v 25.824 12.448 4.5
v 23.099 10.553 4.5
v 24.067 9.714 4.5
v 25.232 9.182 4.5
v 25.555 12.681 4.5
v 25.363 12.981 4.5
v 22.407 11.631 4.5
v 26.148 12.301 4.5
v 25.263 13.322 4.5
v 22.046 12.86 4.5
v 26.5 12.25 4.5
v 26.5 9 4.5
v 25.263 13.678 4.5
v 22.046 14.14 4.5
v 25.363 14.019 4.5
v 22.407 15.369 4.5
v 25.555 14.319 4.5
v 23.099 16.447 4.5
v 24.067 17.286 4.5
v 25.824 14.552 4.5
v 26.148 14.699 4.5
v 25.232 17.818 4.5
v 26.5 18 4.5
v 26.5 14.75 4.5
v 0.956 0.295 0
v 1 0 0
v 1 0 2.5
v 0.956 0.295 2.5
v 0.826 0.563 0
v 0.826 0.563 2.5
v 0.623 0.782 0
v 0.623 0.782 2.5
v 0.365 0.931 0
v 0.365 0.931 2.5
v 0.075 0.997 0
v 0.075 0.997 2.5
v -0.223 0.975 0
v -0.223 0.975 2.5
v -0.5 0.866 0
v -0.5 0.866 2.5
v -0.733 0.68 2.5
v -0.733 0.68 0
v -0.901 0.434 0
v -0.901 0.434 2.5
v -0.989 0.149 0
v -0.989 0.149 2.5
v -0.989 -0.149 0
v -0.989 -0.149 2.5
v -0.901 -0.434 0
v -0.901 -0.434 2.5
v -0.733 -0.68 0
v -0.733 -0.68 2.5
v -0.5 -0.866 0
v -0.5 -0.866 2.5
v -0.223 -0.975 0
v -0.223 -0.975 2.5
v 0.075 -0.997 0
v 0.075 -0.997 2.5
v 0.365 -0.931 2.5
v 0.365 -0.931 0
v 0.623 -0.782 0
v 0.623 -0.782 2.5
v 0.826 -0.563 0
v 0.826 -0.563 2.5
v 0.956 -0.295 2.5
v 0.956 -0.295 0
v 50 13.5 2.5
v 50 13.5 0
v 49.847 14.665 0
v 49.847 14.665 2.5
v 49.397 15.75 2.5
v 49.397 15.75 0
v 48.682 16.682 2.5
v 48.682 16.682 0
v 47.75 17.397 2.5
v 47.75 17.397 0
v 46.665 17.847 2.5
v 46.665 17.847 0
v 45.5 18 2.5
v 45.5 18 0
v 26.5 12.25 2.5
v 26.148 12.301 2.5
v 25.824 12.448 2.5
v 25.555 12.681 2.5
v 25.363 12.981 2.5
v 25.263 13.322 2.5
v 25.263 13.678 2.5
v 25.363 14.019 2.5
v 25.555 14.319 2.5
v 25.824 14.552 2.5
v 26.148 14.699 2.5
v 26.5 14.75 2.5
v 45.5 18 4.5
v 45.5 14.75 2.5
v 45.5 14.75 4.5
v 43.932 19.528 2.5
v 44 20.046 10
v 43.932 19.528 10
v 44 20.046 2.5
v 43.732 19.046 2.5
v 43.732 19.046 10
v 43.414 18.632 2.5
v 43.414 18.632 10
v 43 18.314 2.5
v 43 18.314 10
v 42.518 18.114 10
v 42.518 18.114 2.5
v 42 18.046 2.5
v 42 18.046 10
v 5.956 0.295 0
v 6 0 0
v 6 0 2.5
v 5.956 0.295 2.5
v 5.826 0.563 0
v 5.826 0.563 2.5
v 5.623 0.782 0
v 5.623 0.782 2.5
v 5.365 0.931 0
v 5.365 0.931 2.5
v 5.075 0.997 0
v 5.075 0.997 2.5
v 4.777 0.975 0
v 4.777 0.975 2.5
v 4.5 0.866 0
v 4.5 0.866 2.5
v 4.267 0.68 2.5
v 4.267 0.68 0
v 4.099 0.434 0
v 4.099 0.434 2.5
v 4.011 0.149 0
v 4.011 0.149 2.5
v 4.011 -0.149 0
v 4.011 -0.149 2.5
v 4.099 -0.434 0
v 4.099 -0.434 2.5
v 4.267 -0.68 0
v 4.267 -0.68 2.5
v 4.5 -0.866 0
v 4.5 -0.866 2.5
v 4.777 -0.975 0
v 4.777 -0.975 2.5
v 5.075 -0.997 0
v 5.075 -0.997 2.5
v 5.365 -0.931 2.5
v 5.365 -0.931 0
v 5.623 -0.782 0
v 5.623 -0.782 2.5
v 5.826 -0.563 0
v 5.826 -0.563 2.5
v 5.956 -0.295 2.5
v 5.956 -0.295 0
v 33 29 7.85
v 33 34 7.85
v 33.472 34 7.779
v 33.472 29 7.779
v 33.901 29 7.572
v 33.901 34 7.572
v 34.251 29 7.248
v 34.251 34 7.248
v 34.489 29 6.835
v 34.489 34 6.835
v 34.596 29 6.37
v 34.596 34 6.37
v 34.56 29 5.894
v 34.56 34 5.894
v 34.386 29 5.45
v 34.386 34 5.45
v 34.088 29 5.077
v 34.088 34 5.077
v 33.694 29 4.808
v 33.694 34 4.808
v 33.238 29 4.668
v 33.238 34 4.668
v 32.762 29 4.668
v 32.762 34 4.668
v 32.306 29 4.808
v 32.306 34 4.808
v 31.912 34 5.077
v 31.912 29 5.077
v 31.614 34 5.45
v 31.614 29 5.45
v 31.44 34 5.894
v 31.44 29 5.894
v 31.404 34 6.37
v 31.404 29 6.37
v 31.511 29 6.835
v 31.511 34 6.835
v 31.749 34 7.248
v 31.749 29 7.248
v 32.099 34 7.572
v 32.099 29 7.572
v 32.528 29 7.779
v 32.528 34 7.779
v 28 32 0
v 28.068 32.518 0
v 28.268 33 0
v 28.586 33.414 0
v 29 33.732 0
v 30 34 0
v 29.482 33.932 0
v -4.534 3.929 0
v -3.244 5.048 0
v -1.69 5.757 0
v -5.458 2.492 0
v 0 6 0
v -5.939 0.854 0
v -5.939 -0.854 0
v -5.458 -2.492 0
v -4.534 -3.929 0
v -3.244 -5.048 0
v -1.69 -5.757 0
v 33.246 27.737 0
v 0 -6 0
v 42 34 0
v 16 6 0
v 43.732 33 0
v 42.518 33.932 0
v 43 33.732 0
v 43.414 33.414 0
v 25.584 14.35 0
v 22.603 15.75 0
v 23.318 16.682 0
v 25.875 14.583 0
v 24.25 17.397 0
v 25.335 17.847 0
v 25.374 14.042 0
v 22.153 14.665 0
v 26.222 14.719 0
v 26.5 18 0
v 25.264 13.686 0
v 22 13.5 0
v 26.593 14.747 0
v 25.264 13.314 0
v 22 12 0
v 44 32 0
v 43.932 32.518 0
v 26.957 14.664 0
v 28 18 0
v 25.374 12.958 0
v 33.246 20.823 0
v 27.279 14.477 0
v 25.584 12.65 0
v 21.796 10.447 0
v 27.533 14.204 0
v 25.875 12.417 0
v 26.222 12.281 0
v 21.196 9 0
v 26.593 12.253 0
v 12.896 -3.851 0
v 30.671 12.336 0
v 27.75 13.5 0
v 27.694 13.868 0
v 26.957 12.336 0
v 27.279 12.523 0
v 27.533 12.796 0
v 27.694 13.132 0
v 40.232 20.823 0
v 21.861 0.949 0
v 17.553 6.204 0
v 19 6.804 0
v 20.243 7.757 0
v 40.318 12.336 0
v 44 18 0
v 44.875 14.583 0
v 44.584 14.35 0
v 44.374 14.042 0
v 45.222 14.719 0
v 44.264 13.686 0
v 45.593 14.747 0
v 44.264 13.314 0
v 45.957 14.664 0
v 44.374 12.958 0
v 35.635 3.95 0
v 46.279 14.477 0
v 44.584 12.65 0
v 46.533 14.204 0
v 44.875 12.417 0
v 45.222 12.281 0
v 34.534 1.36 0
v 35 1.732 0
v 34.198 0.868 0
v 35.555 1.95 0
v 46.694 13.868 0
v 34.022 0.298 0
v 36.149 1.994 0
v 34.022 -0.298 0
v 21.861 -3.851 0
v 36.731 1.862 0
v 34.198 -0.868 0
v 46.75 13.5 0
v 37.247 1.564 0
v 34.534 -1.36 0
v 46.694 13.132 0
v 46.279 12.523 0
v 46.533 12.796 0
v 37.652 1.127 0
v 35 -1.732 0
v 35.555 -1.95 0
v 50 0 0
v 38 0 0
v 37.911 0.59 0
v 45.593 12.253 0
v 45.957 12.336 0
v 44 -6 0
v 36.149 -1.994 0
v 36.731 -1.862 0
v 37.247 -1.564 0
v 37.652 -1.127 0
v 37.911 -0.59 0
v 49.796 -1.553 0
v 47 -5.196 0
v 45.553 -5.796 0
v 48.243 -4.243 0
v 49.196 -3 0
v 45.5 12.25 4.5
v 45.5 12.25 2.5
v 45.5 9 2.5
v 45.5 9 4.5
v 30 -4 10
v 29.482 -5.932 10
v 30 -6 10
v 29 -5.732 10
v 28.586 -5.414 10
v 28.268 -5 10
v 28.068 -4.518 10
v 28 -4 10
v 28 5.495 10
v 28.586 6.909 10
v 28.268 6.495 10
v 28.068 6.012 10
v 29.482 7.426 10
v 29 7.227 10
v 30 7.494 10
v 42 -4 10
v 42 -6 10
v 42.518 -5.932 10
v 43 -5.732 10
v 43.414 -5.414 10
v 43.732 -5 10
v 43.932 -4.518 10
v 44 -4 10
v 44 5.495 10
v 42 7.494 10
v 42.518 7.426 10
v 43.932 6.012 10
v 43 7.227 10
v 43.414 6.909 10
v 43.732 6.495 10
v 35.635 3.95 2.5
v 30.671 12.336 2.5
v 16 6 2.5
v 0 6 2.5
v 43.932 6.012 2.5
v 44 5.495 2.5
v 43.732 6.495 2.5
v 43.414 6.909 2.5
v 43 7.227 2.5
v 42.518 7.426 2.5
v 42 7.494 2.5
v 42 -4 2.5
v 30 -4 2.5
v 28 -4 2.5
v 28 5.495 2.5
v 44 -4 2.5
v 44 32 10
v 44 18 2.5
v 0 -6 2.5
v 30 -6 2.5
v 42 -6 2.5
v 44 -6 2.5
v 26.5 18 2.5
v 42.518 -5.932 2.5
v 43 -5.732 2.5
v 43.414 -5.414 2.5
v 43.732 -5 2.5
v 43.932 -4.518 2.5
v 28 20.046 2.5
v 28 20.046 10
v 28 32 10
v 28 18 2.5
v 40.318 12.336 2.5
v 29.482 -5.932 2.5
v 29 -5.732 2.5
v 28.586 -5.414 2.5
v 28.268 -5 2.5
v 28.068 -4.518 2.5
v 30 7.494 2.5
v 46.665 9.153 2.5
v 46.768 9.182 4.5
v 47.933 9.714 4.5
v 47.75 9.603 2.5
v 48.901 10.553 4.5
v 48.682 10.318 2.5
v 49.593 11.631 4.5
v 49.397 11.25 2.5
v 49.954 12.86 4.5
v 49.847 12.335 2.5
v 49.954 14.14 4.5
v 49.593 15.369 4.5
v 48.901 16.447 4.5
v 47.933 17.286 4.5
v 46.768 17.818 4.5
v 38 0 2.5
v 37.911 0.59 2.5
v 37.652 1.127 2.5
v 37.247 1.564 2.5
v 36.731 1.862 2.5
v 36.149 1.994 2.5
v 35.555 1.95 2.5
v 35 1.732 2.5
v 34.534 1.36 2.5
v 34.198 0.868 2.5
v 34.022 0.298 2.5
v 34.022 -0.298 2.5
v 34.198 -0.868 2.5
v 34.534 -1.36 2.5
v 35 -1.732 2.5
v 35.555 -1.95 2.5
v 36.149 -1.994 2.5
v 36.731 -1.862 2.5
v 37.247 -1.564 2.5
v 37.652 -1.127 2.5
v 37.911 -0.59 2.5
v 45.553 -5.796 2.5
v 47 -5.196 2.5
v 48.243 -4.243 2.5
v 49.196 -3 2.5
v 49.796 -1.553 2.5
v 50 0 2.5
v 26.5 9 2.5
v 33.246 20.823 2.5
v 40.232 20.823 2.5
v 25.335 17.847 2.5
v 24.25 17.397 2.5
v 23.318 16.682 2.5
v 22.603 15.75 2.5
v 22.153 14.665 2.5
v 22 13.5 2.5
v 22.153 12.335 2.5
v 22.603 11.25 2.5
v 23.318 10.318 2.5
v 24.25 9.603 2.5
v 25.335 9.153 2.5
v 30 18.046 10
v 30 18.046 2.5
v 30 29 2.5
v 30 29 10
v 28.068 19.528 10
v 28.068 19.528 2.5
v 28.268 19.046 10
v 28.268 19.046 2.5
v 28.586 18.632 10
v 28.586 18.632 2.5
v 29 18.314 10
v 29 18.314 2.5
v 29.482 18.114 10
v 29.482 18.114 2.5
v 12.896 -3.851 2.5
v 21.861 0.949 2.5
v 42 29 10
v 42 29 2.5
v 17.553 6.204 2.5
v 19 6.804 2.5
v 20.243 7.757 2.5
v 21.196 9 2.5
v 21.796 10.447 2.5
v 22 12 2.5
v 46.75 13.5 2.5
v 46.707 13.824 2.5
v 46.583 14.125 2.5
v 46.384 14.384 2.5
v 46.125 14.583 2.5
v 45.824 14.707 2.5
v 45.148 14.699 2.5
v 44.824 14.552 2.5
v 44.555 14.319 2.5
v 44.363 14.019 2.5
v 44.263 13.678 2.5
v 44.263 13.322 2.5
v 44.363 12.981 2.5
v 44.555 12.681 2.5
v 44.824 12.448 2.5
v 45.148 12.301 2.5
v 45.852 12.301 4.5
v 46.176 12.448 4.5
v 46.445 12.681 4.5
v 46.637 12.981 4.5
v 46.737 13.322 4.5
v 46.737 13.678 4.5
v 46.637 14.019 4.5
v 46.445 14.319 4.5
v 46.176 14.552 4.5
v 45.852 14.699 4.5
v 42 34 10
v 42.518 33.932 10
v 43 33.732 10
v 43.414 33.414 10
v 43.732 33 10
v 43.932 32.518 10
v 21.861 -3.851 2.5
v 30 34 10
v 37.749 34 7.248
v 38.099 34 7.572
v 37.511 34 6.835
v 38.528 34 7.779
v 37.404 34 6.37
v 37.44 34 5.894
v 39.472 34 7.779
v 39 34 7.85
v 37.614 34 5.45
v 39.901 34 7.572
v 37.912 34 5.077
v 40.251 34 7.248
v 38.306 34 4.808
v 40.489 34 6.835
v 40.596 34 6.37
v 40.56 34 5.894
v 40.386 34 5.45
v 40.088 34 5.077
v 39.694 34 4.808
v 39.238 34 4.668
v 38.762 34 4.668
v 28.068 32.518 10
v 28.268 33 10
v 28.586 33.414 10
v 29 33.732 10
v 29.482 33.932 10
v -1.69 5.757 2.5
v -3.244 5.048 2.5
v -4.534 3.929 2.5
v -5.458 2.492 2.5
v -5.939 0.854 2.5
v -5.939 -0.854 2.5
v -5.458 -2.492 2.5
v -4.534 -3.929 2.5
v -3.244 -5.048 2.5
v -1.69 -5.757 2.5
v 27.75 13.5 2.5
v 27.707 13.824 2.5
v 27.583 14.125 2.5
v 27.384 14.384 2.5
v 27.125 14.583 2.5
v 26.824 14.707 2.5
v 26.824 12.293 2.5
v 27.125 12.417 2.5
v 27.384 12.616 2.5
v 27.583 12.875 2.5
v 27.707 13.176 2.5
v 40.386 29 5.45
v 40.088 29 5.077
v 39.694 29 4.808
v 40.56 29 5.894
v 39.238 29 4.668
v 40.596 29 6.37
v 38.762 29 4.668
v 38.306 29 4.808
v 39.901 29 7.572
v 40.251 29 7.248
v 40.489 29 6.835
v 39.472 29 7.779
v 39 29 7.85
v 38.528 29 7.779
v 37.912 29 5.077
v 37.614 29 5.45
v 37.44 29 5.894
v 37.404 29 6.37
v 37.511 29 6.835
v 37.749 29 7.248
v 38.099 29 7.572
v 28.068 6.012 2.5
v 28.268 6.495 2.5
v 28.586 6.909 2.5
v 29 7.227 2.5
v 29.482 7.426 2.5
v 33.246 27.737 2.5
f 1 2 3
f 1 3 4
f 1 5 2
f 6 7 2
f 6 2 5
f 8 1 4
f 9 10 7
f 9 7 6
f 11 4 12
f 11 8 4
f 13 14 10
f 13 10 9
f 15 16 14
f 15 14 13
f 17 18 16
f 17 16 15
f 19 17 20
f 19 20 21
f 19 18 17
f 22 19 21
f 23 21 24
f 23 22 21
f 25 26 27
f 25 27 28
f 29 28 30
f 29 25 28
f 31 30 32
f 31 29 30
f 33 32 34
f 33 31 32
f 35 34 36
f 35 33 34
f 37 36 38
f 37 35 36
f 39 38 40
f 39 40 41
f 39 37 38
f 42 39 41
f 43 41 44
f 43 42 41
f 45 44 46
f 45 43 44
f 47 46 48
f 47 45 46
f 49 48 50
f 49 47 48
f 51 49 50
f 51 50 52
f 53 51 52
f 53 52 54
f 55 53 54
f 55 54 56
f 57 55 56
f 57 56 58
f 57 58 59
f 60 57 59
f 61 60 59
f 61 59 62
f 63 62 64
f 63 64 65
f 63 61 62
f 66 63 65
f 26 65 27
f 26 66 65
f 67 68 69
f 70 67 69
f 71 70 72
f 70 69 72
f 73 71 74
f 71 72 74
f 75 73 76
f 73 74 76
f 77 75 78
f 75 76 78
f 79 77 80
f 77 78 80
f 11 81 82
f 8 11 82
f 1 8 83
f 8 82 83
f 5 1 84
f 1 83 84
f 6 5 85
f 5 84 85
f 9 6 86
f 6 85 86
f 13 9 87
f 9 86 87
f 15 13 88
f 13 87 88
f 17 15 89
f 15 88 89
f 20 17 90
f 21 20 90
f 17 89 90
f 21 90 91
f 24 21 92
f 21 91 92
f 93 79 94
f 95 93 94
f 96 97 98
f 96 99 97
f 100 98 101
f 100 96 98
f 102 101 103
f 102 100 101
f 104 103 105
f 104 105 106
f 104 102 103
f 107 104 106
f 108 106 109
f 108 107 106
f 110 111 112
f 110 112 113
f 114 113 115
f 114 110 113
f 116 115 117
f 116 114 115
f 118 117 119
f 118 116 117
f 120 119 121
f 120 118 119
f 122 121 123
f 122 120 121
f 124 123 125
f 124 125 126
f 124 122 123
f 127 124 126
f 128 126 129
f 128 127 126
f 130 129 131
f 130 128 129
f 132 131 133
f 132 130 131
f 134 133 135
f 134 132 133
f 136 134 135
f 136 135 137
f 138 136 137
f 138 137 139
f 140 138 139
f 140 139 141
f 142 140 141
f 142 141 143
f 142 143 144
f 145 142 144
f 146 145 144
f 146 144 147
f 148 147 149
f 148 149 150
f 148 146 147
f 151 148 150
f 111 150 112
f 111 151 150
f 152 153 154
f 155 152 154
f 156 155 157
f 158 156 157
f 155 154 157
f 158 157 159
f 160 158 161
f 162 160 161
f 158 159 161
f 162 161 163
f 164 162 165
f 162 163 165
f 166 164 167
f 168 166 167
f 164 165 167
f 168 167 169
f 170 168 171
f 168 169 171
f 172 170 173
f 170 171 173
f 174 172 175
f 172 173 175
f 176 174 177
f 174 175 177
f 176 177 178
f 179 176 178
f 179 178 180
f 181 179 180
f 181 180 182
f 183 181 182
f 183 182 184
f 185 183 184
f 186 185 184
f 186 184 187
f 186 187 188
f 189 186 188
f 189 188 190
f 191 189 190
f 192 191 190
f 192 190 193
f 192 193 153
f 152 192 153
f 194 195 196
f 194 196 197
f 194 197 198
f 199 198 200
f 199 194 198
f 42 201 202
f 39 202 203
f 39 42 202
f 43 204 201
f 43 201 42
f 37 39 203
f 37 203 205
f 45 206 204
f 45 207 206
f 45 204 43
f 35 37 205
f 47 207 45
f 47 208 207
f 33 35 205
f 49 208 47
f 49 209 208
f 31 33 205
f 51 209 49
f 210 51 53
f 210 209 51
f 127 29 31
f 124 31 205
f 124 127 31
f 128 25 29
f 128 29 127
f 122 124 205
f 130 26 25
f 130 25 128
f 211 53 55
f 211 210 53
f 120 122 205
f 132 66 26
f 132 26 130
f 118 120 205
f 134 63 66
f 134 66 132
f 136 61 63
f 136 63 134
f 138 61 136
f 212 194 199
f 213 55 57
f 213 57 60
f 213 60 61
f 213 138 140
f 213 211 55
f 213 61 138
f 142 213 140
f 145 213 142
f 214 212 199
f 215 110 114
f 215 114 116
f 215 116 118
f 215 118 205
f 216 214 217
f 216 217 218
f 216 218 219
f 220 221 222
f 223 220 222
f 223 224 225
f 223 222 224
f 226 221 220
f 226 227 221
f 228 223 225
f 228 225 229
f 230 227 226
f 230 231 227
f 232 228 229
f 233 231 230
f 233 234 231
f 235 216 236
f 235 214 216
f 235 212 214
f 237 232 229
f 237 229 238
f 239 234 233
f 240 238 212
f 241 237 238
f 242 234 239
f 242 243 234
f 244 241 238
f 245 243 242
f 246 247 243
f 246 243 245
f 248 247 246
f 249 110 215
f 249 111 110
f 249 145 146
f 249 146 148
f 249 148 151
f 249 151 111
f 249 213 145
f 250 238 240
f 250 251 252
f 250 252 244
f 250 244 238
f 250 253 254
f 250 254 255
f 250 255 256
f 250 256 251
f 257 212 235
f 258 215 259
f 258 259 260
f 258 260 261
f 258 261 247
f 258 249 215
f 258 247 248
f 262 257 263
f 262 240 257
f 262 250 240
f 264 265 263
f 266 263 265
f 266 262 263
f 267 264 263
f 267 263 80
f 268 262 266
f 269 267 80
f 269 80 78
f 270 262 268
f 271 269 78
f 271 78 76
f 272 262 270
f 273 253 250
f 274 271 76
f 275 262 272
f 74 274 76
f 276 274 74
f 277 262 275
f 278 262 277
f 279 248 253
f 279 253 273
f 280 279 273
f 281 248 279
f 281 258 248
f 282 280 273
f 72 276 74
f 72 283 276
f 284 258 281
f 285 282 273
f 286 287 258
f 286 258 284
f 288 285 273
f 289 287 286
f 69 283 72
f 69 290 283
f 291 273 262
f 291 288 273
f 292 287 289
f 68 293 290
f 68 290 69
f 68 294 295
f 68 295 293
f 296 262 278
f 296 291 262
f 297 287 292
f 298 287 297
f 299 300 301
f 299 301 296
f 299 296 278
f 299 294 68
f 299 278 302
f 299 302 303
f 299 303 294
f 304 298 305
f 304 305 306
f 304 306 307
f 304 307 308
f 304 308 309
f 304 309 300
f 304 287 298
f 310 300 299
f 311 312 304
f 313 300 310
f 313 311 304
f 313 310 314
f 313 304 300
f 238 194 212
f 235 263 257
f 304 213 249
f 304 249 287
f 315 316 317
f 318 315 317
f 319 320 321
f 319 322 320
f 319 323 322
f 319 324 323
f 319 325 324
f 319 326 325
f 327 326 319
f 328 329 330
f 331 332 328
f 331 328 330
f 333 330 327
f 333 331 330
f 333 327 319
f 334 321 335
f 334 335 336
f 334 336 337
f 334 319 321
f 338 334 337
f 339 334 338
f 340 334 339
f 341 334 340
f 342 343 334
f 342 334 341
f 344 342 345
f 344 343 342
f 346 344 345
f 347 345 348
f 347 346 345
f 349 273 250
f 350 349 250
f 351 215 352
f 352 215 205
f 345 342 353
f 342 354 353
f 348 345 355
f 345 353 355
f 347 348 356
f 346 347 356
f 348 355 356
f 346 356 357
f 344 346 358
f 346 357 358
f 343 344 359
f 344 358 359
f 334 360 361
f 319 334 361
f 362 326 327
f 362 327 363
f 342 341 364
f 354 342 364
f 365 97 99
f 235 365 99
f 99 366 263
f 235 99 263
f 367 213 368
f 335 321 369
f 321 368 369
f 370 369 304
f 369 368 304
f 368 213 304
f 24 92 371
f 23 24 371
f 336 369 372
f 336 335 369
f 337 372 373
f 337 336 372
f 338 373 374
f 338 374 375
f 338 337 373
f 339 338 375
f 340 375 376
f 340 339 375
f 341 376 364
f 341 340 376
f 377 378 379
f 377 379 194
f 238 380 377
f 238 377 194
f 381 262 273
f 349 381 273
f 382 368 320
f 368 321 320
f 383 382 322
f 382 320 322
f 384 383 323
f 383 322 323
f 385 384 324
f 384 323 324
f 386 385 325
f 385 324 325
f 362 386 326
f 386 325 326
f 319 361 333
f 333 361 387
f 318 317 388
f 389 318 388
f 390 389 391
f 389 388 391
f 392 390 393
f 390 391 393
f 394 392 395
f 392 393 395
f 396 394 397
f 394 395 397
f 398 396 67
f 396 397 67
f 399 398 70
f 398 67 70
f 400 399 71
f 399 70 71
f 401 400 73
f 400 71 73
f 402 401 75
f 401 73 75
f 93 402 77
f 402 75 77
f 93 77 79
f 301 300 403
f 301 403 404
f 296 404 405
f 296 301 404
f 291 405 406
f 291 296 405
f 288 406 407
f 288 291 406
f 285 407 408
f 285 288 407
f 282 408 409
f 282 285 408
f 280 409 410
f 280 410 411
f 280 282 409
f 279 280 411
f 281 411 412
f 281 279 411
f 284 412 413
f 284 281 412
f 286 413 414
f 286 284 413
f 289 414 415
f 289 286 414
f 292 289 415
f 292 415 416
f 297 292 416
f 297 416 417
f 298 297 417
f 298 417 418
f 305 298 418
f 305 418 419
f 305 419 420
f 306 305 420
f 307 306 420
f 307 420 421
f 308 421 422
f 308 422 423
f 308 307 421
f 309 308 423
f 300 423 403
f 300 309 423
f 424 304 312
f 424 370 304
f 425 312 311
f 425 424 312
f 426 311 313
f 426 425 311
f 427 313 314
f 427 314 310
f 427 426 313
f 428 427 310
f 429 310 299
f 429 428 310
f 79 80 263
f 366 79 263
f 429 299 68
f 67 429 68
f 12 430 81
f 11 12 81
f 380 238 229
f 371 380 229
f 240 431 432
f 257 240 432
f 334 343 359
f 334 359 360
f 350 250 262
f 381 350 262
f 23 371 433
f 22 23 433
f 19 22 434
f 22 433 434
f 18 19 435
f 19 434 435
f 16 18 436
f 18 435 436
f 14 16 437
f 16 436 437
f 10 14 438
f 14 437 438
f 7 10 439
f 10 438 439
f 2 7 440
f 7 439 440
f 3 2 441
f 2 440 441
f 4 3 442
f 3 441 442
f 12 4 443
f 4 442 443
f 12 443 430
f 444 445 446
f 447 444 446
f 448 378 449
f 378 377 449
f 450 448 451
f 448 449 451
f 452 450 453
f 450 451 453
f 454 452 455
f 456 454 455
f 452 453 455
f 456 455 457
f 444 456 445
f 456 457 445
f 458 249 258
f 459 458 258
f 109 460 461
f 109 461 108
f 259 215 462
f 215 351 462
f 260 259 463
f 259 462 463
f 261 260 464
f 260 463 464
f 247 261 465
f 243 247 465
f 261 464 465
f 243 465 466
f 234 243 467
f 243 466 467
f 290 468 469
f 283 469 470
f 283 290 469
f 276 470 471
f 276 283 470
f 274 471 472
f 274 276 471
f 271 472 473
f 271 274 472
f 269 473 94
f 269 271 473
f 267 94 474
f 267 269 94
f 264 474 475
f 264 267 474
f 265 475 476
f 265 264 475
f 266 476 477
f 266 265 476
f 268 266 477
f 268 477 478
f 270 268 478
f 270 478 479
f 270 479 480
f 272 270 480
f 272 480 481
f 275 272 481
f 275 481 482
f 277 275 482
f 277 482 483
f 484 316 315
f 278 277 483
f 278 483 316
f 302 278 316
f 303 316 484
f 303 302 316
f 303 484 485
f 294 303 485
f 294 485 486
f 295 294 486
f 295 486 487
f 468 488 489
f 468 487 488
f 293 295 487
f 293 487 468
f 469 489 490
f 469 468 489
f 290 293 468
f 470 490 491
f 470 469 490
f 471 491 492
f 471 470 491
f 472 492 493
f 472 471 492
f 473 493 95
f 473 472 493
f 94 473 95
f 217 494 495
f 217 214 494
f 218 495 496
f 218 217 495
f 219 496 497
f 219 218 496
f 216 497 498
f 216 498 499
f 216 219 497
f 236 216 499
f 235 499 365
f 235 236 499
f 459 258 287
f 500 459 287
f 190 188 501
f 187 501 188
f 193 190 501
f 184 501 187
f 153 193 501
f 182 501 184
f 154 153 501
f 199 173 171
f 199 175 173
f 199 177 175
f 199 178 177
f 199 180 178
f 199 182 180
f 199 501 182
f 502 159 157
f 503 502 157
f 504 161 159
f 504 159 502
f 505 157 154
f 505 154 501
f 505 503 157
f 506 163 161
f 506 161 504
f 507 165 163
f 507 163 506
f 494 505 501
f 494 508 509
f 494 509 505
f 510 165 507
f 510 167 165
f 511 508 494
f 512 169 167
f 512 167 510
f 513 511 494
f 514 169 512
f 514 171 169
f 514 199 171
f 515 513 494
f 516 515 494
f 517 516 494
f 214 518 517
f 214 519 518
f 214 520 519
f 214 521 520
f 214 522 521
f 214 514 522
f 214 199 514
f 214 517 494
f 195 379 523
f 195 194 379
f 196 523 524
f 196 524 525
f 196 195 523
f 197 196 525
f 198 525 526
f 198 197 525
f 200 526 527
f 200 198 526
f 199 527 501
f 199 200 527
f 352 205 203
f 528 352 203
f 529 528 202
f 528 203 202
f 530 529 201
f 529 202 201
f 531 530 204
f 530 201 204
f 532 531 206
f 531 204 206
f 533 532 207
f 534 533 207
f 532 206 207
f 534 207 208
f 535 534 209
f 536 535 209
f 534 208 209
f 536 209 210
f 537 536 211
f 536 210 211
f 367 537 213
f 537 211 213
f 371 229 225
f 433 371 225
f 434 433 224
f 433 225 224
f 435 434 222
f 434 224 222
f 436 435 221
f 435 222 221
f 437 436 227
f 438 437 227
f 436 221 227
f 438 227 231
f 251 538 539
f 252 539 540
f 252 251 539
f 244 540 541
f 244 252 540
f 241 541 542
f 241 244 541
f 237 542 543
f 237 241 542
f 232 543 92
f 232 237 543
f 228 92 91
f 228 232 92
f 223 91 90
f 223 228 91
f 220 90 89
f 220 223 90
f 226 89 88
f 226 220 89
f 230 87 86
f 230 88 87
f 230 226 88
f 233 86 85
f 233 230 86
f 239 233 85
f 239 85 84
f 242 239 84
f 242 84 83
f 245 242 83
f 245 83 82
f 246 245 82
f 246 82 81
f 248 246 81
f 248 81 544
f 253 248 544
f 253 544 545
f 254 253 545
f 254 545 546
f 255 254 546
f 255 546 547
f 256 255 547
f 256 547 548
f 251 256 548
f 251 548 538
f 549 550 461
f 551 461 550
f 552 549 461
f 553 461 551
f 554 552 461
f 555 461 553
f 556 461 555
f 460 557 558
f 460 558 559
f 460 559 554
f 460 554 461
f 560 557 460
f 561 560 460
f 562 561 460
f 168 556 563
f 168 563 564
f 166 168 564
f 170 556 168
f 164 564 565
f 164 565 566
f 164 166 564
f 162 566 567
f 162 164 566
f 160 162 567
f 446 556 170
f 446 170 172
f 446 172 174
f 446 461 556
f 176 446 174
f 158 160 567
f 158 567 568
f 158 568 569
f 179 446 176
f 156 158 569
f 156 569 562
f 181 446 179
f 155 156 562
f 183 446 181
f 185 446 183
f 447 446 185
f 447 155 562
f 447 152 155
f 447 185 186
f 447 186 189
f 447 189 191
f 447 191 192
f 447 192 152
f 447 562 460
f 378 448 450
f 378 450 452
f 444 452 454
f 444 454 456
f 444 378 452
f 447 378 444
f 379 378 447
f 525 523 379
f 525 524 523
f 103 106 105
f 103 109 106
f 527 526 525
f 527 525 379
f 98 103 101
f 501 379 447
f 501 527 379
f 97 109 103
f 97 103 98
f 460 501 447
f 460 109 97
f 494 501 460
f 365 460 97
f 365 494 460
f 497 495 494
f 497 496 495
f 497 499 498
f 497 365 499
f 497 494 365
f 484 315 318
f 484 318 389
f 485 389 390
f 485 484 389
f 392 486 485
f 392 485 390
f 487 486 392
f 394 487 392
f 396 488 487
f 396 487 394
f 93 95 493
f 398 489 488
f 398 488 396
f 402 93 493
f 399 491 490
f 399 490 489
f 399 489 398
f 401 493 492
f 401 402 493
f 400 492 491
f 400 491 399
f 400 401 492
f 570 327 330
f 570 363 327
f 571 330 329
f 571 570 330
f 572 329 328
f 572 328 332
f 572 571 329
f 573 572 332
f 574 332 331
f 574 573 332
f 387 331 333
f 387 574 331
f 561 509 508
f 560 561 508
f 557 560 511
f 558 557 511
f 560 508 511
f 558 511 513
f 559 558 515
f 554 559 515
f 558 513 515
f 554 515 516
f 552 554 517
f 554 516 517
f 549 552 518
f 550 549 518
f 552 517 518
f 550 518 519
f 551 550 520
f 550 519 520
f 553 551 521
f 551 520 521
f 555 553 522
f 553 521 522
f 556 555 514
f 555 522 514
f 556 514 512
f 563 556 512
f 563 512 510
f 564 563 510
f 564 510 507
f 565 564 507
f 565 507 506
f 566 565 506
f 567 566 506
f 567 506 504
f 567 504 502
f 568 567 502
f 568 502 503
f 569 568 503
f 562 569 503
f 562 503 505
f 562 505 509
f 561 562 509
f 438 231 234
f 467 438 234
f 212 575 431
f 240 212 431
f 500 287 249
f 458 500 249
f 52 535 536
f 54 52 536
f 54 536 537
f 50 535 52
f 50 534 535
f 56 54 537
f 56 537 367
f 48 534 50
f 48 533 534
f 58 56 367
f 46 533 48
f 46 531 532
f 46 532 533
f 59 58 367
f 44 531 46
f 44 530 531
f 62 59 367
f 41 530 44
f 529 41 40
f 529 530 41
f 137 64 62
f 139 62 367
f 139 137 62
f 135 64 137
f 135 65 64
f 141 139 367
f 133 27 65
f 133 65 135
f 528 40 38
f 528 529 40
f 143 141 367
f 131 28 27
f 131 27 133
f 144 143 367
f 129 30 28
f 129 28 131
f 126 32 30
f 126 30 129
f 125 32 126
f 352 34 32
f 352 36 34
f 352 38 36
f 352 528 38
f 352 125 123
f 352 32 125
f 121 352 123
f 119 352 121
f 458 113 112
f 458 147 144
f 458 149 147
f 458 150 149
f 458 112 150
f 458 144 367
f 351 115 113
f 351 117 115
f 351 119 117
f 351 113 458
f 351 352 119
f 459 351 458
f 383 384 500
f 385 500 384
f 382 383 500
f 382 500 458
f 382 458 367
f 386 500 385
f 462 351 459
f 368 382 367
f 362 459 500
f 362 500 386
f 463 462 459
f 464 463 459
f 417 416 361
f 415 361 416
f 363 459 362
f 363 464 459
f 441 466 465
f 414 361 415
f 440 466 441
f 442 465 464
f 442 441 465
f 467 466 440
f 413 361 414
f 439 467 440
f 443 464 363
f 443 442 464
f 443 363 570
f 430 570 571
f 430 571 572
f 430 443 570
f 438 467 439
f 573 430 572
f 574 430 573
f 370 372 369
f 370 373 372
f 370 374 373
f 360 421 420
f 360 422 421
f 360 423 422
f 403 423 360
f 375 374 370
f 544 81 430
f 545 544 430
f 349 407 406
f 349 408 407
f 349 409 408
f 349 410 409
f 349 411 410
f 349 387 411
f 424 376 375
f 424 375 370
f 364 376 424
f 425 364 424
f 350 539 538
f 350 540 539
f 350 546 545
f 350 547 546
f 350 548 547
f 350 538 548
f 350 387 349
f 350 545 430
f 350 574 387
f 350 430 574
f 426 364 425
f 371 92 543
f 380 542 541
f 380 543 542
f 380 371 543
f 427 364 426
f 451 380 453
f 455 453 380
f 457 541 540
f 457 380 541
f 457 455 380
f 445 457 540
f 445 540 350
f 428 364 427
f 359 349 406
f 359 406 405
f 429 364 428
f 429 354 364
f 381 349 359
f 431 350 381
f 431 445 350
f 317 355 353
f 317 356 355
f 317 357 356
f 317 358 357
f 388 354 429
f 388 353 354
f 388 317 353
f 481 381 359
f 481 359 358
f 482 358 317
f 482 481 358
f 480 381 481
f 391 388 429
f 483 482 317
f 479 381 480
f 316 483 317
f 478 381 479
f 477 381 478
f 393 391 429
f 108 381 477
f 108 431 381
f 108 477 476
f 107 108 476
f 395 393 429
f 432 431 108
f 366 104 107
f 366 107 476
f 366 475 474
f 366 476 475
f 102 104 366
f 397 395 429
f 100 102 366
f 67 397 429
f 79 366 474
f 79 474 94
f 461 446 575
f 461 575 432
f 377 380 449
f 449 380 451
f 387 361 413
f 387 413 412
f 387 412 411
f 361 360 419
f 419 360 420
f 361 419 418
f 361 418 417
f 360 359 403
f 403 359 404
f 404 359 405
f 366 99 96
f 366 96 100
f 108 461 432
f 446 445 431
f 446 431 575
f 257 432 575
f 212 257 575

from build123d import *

# Parameters (mm, degrees)
SKETCH_1_R          = 1.25
SKETCH_1_R_2        = 1
SKETCH_1_R_3        = 2
EXTRUDE_1_DEPTH     = 2.5
EXTRUDE_2_DEPTH     = 10
EXTRUDE_START       = 2.5
EXTRUDE_4_DEPTH     = 2
FILLET_1_R          = 1
FILLET_2_R          = 6
EXTRUDE_START_2     = 7.5
SKETCH_2_W          = 2
SKETCH_2_H          = 16
EXTRUDE_5_DEPTH     = 7.5
SKETCH_3_W          = 7.5
SKETCH_3_H          = 5
EXTRUDE_6_DEPTH     = 14
SKETCH_4_R          = 1.6
CUT_EXTRUDE_1_DEPTH = 10
CUT_EXTRUDE_2_DEPTH = 10
CUT_EXTRUDE_3_DEPTH = 10
SKETCH_7_W          = 16
SKETCH_7_H          = 2.5
EXTRUDE_7_DEPTH     = 16
SKETCH_8_W          = 16
SKETCH_8_H          = 10.551633207
CUT_EXTRUDE_4_DEPTH = 7.5
CUT_EXTRUDE_5_DEPTH = 10
FILLET_3_R          = 2


with BuildPart() as part:
    # 草图1 → 凸台-拉伸1 (new body)
    with BuildSketch(Plane.XY):
        with BuildLine():
            Line((22, 6), (0, 6))
            ThreePointArc((0, 6), (-6, 0), (0, -6))
            Line((0, -6), (50, -6))
            Line((50, -6), (50, 13.5))
            ThreePointArc((50, 13.5), (48.681980515, 16.681980515), (45.5, 18))
            Line((45.5, 18), (26.5, 18))
            ThreePointArc((26.5, 18), (23.318019485, 16.681980515), (22, 13.5))
            Line((22, 13.5), (22, 6))
        make_face()
        with Locations((45.5, 13.5)):
            Circle(SKETCH_1_R, mode=Mode.SUBTRACT)
        with Locations((26.5, 13.5)):
            Circle(SKETCH_1_R, mode=Mode.SUBTRACT)
        Circle(SKETCH_1_R_2, mode=Mode.SUBTRACT)
        with Locations((5, 0)):
            Circle(SKETCH_1_R_2, mode=Mode.SUBTRACT)
        with Locations((36, 0)):
            Circle(SKETCH_1_R_3, mode=Mode.SUBTRACT)
    extrude(amount=EXTRUDE_1_DEPTH)

    # 草图1<3> → 凸台-拉伸2 (add)
    with BuildSketch(Plane.XY):
        Polygon((28, 9), (28, 6), (28, -6), (44, -6), (44, 9), (42, 9), (42, -4), (30, -4), (30, 9), align=None)
    extrude(amount=EXTRUDE_2_DEPTH)

    # 草图1<5> → 凸台-拉伸4 (add)
    with BuildSketch(Plane.XY.offset(EXTRUDE_START)):
        with BuildLine():
            ThreePointArc((26.5, 18), (22, 13.5), (26.5, 9))
            Line((26.5, 9), (26.5, 12.25))
            ThreePointArc((26.5, 12.25), (25.25, 13.5), (26.5, 14.75))
            Line((26.5, 14.75), (26.5, 18))
        make_face()
        with BuildLine():
            Line((45.5, 12.25), (45.5, 9))
            ThreePointArc((45.5, 9), (50, 13.5), (45.5, 18))
            Line((45.5, 18), (45.5, 14.75))
            ThreePointArc((45.5, 14.75), (46.75, 13.5), (45.5, 12.25))
        make_face()
    extrude(amount=EXTRUDE_4_DEPTH)

    # 圆角1
    fillet_1_edges = [part.edges().sort_by_distance(p)[0] for p in [
        (42, 9, 6.25),
        (30, 9, 6.25),
    ]]
    fillet(fillet_1_edges, radius=FILLET_1_R)

    # 圆角2
    fillet_2_edges = [part.edges().sort_by_distance(p)[0] for p in [
        (50, -6, 1.25),
        (22, 6, 1.25),
    ]]
    fillet(fillet_2_edges, radius=FILLET_2_R)

    # 草图2 → 凸台-拉伸5 (add)
    with BuildSketch(Plane.XY.offset(2.5).offset(EXTRUDE_START_2)):
        with Locations((43, 26)):
            Rectangle(SKETCH_2_W, SKETCH_2_H)
        with BuildLine():
            Line((43, 9), (44, 9))
            Line((44, 9), (44, 18))
            Line((44, 18), (42, 18))
            Line((42, 18), (42, 8))
            ThreePointArc((42, 8), (42.292893219, 8.707106781), (43, 9))
        make_face()
        with BuildLine():
            Line((28, 18), (28, 9))
            Line((28, 9), (29, 9))
            ThreePointArc((29, 9), (29.707106781, 8.707106781), (30, 8))
            Line((30, 8), (30, 18))
            Line((30, 18), (28, 18))
        make_face()
        with Locations((29, 26)):
            Rectangle(SKETCH_2_W, SKETCH_2_H)
    extrude(amount=-EXTRUDE_5_DEPTH)

    # 草图3 → 凸台-拉伸6 (add)
    with BuildSketch(Plane.ZY.offset(-28)):
        with Locations((6.25, 31.5)):
            Rectangle(SKETCH_3_W, SKETCH_3_H)
    extrude(amount=-EXTRUDE_6_DEPTH)

    # 草图4 → 切除-拉伸1 (cut)
    with BuildSketch(Plane(origin=(0, 34, 0), x_dir=(1, 0, 0), z_dir=(0, 1, 0))):
        with Locations(Location((33, -6.25, 0), (0, 0, 270))):
            Circle(SKETCH_4_R)
        with Locations(Location((39, -6.25, 0), (0, 0, 270))):
            Circle(SKETCH_4_R)
    extrude(amount=-CUT_EXTRUDE_1_DEPTH, mode=Mode.SUBTRACT)

    # 草图5 → 切除-拉伸2 (cut)
    with BuildSketch(Plane(origin=(0, 0, 0), x_dir=(-1, 0, 0), z_dir=(0, 0, -1))):
        Polygon((-30.670698378, 12.335500495), (-40.317654114, 12.335500495), (-35.634644198, 3.950389209), align=None)
    extrude(amount=-CUT_EXTRUDE_2_DEPTH, mode=Mode.SUBTRACT)

    # 草图6 → 切除-拉伸3 (cut)
    with BuildSketch(Plane(origin=(0, 0, 0), x_dir=(-1, 0, 0), z_dir=(0, 0, -1))):
        Polygon((-21.861162721, 0.94929577), (-21.861162721, -3.850507305), (-12.896241274, -3.850507305), align=None)
    extrude(amount=-CUT_EXTRUDE_3_DEPTH, mode=Mode.SUBTRACT)

    # 草图7 → 凸台-拉伸7 (add)
    with BuildSketch(Plane(origin=(0, 18, 0), x_dir=(1, 0, 0), z_dir=(0, 1, 0))):
        with Locations((36, -1.25)):
            Rectangle(SKETCH_7_W, SKETCH_7_H)
    extrude(amount=EXTRUDE_7_DEPTH)

    # 草图8 → 切除-拉伸4 (cut)
    with BuildSketch(Plane.XY.offset(10)):
        with Locations((36, 12.770298386)):
            Rectangle(SKETCH_8_W, SKETCH_8_H)
    extrude(amount=-CUT_EXTRUDE_4_DEPTH, mode=Mode.SUBTRACT)

    # 草图9 → 切除-拉伸5 (cut)
    with BuildSketch(Plane.XY.offset(2.5)):
        Polygon((33.245819602, 20.82286057), (40.232309823, 20.82286057), (33.245819602, 27.737325118), align=None)
    extrude(amount=-CUT_EXTRUDE_5_DEPTH, mode=Mode.SUBTRACT)

    # 圆角3
    fillet_3_edges = [part.edges().sort_by_distance(p)[0] for p in [
        (44, 34, 5),
        (28, 34, 5),
        (28, 18.046114989, 6.25),
        (28, 7.494481782, 6.25),
        (44, 18.046114989, 6.25),
        (44, 7.494481782, 6.25),
        (28, -6, 6.25),
        (44, -6, 6.25),
    ]]
    fillet(fillet_3_edges, radius=FILLET_3_R - 0.0001)  # a hair under: the kernel refuses the full size


solid = part.part
